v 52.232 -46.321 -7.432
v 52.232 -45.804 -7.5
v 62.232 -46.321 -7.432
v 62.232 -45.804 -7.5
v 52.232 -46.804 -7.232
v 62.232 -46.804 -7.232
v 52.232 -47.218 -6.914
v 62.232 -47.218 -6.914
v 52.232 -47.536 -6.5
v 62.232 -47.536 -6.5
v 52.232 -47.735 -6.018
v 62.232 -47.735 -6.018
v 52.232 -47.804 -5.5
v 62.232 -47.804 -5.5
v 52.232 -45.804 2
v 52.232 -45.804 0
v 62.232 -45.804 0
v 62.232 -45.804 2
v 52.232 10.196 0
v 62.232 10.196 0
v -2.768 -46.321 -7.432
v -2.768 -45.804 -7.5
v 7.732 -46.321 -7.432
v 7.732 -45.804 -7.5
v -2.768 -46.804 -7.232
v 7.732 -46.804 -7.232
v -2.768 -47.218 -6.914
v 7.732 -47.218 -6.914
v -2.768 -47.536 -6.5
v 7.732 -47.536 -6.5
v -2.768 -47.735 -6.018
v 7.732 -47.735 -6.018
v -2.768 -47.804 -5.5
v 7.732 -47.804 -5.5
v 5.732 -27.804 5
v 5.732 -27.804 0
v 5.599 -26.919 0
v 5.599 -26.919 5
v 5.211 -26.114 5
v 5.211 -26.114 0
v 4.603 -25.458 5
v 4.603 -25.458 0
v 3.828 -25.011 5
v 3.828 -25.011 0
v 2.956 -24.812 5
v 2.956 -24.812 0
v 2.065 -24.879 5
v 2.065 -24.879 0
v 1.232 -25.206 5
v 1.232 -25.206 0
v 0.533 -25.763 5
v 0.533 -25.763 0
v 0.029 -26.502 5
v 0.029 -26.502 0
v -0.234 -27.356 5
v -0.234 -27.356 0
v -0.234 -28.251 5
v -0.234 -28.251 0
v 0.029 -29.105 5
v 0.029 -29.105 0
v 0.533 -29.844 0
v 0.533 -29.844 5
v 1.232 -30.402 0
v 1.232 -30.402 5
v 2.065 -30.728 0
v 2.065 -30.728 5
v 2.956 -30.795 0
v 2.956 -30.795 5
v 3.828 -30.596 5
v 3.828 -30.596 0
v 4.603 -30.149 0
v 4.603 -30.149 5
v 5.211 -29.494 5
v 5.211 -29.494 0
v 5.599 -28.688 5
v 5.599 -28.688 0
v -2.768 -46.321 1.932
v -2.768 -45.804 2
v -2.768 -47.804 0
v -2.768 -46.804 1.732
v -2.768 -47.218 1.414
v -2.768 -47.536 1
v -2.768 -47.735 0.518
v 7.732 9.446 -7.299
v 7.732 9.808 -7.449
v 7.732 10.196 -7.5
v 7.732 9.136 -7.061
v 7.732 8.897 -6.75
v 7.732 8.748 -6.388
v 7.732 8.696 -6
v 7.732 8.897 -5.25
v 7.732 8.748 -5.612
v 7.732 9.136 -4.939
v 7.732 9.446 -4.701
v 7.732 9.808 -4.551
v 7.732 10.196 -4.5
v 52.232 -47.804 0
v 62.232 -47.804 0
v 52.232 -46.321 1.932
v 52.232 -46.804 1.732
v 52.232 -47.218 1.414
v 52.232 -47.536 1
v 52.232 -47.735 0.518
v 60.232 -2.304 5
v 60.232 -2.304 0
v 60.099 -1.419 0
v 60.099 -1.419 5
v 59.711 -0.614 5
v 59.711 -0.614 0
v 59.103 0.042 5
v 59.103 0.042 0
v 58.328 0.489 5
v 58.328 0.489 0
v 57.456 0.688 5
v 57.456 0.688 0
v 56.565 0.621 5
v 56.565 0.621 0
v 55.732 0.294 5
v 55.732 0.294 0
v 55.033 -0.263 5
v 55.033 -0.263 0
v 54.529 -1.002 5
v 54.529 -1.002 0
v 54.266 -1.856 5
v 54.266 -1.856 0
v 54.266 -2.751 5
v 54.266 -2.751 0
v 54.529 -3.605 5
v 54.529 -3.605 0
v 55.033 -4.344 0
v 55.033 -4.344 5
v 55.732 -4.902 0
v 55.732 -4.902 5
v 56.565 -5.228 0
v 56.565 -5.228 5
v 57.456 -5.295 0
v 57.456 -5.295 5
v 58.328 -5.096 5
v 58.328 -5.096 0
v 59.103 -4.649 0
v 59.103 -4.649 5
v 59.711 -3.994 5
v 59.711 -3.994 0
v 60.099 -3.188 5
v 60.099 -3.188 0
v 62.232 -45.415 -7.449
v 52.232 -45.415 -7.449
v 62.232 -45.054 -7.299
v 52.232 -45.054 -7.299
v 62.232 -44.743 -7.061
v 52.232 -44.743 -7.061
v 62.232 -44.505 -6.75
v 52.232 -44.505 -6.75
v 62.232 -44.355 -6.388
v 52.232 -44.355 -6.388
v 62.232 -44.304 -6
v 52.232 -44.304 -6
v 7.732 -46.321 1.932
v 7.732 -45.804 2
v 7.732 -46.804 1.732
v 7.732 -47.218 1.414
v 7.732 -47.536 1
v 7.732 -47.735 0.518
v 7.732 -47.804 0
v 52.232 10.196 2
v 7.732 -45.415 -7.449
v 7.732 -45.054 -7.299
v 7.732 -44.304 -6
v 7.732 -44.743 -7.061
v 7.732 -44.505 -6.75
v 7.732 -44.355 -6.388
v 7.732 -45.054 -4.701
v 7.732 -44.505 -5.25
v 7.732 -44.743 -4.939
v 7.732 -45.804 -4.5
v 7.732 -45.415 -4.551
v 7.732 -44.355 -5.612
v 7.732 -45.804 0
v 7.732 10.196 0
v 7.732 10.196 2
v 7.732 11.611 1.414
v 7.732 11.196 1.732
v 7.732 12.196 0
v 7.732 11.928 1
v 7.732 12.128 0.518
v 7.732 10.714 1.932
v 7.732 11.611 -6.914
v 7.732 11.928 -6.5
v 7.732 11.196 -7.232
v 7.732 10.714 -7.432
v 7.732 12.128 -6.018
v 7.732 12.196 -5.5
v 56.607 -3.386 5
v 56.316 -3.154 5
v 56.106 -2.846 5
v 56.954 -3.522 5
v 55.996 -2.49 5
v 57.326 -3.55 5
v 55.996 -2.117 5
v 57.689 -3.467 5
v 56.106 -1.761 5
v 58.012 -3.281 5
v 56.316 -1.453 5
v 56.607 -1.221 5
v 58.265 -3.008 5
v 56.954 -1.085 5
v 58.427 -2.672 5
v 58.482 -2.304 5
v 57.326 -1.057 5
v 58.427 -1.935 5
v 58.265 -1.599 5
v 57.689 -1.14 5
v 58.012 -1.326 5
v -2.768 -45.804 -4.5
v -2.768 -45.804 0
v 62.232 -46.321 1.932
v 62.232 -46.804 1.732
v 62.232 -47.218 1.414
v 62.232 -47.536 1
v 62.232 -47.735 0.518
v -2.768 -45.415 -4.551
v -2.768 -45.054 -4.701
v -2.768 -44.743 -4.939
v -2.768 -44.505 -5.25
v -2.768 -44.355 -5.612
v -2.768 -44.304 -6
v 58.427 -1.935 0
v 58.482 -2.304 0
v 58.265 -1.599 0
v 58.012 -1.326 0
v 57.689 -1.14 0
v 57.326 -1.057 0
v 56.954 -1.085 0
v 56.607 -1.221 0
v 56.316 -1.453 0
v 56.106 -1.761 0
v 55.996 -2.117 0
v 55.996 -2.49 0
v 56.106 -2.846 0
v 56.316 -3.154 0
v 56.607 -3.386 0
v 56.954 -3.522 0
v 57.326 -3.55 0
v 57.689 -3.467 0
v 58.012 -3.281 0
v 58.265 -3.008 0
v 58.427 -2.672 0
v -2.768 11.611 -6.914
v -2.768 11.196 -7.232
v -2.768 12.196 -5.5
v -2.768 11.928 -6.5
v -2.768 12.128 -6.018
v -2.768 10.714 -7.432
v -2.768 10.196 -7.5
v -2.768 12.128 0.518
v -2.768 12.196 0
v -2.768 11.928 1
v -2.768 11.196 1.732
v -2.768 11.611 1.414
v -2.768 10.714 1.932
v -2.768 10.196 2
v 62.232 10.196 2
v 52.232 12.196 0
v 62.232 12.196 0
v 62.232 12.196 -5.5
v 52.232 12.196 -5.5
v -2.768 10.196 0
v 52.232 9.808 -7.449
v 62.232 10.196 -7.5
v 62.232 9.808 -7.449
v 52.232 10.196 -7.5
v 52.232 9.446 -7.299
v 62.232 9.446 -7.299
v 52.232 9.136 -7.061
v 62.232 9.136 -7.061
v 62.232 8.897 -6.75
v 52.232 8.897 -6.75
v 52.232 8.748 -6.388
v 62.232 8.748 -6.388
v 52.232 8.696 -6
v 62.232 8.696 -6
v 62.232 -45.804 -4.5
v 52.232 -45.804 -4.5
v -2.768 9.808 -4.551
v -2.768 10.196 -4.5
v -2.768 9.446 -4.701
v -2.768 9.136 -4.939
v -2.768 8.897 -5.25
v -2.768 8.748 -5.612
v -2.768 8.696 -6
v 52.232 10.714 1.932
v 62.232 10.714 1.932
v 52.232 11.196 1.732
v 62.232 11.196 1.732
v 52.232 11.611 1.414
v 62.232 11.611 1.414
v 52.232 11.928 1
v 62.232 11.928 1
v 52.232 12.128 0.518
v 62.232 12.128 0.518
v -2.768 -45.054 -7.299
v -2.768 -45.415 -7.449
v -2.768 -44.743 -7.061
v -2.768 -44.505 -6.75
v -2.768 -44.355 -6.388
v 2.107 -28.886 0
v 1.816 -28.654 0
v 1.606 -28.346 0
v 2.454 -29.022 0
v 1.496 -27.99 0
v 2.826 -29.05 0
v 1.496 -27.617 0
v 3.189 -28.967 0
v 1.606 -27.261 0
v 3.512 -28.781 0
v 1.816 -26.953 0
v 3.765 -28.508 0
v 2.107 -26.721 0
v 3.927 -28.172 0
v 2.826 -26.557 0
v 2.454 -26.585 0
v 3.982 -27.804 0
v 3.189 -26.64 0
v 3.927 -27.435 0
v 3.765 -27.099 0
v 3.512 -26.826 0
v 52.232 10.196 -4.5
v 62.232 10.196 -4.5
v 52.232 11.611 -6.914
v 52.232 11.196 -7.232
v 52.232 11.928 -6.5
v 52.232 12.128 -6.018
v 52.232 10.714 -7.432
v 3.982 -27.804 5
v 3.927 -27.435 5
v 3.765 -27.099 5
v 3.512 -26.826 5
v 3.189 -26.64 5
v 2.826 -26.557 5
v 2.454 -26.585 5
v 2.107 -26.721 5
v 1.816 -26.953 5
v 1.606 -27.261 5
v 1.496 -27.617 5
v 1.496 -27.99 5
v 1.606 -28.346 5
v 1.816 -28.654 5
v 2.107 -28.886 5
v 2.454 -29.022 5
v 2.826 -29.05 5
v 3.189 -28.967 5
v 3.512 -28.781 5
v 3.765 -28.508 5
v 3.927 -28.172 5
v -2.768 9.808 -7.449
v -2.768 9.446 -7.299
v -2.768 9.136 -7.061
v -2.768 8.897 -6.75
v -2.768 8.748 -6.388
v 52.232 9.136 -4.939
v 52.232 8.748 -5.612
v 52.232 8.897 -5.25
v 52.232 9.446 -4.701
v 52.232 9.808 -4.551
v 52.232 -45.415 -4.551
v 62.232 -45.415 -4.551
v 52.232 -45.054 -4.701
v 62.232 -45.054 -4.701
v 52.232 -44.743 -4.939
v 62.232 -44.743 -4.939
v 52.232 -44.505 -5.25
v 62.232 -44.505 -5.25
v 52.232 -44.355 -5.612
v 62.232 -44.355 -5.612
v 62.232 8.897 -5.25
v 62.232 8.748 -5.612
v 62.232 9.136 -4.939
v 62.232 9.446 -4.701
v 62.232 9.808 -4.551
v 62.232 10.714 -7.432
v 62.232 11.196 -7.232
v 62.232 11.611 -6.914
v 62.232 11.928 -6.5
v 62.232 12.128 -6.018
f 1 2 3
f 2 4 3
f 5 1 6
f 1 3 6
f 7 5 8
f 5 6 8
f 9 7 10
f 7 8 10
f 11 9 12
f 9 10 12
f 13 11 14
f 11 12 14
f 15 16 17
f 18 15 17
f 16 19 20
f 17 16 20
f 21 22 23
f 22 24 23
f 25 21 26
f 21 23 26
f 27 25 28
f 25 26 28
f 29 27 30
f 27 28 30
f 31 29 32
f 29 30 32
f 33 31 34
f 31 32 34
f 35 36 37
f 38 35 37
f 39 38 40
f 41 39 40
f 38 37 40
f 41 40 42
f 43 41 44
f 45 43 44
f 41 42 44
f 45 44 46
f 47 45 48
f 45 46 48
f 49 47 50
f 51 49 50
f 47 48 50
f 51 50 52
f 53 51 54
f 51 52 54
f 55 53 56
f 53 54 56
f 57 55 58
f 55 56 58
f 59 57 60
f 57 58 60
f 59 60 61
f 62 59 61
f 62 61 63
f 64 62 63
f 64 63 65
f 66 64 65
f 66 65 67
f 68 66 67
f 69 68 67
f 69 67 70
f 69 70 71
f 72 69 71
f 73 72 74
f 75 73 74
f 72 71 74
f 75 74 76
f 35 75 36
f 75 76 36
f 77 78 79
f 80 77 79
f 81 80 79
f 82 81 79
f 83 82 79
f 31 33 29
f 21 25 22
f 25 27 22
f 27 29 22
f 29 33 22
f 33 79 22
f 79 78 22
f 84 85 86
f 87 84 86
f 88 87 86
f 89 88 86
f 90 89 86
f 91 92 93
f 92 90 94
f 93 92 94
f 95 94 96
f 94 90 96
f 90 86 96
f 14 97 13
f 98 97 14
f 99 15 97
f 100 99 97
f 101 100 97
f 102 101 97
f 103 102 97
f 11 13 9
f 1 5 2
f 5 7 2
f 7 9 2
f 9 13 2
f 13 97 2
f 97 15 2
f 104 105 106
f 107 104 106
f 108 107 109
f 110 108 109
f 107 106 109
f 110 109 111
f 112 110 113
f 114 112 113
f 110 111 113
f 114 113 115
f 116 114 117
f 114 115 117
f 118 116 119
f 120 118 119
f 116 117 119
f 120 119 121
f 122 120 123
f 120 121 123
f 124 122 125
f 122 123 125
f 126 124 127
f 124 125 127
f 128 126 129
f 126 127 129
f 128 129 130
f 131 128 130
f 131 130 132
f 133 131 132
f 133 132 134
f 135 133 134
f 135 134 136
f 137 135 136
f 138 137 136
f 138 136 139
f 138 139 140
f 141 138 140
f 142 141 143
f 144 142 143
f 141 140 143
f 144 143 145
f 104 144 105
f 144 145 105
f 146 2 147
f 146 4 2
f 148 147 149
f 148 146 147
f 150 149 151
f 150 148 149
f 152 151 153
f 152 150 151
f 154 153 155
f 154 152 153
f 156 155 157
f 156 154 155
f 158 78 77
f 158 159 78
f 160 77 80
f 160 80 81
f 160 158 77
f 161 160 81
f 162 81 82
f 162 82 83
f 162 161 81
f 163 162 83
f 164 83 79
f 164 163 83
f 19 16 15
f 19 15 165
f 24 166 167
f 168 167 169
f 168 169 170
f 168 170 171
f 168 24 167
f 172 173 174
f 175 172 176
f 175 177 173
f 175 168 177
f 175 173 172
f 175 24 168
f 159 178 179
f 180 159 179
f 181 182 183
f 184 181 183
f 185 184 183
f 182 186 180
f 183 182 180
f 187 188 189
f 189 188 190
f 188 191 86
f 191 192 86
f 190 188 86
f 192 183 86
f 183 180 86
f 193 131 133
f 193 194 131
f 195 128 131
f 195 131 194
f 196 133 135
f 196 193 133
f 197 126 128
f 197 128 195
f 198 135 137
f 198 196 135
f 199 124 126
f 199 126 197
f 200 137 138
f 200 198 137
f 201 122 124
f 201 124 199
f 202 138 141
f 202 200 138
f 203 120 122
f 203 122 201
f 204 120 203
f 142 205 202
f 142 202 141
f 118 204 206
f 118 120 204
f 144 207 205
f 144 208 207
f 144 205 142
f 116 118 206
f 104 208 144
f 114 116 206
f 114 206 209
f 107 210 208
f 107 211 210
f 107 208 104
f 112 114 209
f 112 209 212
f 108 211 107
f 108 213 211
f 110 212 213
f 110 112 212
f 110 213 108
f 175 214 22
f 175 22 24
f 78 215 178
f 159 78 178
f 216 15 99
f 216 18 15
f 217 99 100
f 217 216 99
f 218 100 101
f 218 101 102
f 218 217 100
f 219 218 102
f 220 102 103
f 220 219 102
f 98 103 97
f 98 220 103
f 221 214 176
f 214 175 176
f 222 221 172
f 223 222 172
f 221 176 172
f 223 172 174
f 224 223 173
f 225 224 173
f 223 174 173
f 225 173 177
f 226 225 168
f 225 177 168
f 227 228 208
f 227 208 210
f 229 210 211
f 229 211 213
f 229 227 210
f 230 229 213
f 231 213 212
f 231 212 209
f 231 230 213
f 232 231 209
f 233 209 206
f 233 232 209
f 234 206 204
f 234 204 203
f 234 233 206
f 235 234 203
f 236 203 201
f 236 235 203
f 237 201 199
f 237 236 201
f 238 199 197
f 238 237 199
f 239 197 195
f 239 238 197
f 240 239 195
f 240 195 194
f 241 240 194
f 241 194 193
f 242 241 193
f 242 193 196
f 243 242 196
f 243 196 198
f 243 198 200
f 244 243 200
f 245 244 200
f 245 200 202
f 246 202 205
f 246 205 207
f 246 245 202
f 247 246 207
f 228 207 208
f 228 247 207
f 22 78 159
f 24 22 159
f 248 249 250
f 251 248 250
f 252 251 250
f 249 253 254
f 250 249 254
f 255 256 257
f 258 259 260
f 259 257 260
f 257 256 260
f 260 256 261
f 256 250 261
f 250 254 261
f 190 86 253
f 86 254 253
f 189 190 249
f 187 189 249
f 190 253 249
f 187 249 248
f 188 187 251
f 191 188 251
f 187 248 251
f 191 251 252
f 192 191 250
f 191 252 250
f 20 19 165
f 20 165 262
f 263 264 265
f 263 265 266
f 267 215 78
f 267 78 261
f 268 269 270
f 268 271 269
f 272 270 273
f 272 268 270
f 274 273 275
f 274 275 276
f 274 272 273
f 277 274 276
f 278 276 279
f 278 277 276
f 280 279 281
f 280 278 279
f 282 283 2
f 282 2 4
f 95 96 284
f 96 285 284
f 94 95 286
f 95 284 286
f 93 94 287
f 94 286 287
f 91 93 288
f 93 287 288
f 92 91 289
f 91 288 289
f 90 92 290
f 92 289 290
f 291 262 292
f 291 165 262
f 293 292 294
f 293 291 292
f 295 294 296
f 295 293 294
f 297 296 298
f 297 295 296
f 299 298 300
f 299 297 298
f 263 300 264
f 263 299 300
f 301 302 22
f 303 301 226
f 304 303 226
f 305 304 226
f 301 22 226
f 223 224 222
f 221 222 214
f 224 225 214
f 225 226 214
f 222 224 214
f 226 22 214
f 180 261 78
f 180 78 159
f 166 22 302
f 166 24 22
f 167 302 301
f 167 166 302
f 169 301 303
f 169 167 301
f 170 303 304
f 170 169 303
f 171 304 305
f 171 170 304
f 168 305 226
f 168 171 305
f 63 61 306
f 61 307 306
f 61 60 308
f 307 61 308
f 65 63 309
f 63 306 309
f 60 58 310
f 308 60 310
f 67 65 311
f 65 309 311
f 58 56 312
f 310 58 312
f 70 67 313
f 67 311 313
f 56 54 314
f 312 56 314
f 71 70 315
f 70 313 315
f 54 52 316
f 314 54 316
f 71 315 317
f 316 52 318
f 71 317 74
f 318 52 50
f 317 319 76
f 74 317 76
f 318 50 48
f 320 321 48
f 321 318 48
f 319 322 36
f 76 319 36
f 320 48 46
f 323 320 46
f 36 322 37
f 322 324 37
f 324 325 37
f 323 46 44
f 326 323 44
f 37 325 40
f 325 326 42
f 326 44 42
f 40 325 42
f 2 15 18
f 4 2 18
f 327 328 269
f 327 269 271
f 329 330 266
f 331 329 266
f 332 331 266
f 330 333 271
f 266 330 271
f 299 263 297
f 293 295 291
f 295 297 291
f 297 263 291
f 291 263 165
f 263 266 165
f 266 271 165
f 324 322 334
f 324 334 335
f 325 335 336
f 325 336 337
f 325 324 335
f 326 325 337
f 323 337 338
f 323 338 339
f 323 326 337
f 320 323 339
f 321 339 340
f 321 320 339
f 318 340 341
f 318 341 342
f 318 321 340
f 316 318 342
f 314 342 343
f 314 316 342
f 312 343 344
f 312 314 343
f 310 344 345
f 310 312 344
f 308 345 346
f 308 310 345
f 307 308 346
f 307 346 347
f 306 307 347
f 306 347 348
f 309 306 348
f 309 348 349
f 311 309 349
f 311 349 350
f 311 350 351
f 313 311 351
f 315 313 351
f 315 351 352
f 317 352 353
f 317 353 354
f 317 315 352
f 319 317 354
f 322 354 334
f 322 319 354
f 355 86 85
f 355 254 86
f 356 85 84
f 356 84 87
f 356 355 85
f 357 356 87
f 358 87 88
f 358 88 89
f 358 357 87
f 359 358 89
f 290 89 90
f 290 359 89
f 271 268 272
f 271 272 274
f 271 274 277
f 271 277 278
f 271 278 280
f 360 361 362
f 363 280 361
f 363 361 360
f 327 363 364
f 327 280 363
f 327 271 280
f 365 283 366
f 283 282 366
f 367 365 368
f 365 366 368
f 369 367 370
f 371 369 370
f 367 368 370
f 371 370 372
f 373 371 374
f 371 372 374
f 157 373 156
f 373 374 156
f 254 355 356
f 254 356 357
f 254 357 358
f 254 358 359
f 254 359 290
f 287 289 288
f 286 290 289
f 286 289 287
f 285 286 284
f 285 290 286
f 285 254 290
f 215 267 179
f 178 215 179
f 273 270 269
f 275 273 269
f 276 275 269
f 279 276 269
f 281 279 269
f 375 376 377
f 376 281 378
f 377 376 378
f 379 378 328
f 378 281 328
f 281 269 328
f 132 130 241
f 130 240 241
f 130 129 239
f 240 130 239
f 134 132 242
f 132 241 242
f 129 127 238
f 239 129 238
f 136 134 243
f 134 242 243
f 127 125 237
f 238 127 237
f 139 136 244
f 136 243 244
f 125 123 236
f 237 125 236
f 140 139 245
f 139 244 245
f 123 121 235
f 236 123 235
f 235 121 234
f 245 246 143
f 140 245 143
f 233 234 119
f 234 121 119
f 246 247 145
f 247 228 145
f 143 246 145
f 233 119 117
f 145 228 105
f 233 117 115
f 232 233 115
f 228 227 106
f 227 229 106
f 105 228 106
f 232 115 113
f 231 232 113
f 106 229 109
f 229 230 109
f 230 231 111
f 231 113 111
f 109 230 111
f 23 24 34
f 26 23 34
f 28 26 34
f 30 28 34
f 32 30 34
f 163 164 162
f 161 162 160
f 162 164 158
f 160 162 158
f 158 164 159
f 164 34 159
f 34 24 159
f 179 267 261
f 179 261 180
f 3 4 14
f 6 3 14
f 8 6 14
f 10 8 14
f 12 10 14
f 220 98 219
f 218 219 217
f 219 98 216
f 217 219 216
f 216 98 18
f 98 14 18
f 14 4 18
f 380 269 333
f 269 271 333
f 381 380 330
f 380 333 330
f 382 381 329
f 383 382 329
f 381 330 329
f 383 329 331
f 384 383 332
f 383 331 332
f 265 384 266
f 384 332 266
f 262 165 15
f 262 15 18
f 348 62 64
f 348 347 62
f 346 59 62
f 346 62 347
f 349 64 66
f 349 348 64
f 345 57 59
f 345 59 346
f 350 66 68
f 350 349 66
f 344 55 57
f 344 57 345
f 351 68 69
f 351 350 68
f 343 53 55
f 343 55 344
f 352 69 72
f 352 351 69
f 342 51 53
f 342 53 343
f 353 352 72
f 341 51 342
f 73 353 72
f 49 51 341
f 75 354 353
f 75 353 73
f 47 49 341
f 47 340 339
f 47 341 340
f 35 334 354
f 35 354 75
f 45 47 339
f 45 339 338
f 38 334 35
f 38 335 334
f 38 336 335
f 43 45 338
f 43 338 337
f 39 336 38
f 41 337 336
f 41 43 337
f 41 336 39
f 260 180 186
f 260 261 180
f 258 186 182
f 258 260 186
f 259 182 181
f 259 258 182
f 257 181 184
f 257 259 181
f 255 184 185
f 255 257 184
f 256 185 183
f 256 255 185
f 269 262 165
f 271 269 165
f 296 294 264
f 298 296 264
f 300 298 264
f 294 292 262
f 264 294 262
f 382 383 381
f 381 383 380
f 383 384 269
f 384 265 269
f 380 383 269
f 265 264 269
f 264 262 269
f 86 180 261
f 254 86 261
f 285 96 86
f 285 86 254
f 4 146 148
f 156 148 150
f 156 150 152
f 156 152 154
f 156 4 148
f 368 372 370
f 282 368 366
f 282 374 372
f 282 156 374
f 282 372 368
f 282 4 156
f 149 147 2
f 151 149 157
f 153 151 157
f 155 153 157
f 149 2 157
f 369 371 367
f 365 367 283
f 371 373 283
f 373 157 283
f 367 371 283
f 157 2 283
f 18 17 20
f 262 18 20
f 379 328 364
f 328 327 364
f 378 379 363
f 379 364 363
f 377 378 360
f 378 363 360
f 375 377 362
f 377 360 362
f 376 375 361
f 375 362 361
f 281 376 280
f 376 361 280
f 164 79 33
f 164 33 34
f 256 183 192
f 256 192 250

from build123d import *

# Parameters (mm, degrees)
F0_R     = 3
F0_R_2   = 1.25
F1_DEPTH = 5
F2_W     = 10.4999952316
F2_H     = 56
F3_DEPTH = 2
F2_W_2   = 10.0000047684
F4_W     = 10.4999952316
F4_H     = 2
F4_H_2   = 4.5
F4_H_3   = 3
F6_DEPTH = 2
F4_W_2   = 10.0000047684
F5_W     = 10.4999952316
F5_H     = 2
F5_H_2   = 4.5
F5_H_3   = 3
F7_DEPTH = 2
F5_W_2   = 10.0000047684
F5_H_4   = 6.5
F8_DEPTH = 1.5
F9_DEPTH = 1.5
F10_R    = 1.99999
F10_2_R  = 1.99999
F10_3_R  = 1.99999
F10_4_R  = 1.99999
F11_R    = 1.49999
F11_2_R  = 1.49999
F11_3_R  = 1.49999
F11_4_R  = 1.49999


# Not quite as in the source:
# - a fillet or chamfer is up to 0.001 mm smaller than in the source, because OpenCascade refuses the exact size


with BuildPart() as f1:
    # F0 (on Top) → F1 (new body)
    with BuildSketch(Plane.XY):
        with Locations((2.732144177, -27.8035767078)):
            Circle(F0_R)
        with Locations((2.732144177, -27.8035767078)):
            Circle(F0_R_2, mode=Mode.SUBTRACT)
    extrude(amount=F1_DEPTH)


with BuildPart() as f1b:
    # F0 (on Top) → F1, piece 2 (new body)
    with BuildSketch(Plane.XY):
        with Locations((57.232144177, -2.3035767078)):
            Circle(F0_R)
        with Locations((57.232144177, -2.3035767078)):
            Circle(F0_R_2, mode=Mode.SUBTRACT)
    extrude(amount=F1_DEPTH)


with BuildPart() as f3:
    # F2 (on Top) → F3 (new body)
    with BuildSketch(Plane.XY):
        with Locations((2.4821465611, -17.8035767078)):
            Rectangle(F2_W, F2_H)
    extrude(amount=F3_DEPTH)


with BuildPart() as f3b:
    # F2 (on Top) → F3, piece 2 (new body)
    with BuildSketch(Plane.XY):
        with Locations((57.2321465611, -17.8035767078)):
            Rectangle(F2_W_2, F2_H)
    extrude(amount=F3_DEPTH)


with BuildPart() as f6:
    # F4 (on face) → F6 (new body)
    with BuildSketch(Plane(origin=(0, 10.1964232922, 0), x_dir=(-1, 0, 0), z_dir=(0, 1, 0))):
        with Locations((-2.4821465611, 1)):
            Rectangle(F4_W, F4_H)
        with Locations((-2.4821465611, -2.25)):
            Rectangle(F4_W, F4_H_2)
        with Locations((-2.4821465611, -6)):
            Rectangle(F4_W, F4_H_3)
    extrude(amount=F6_DEPTH)

    # F10#3 (radius 2 in the source; OpenCascade refuses exactly that, so slightly less here)
    f10_3_edges = [f6.edges().sort_by_distance(p)[0] for p in [
        (2.482147, 12.196423, 2),
        (2.482147, 12.196423, -7.5),
    ]]
    fillet(f10_3_edges, radius=F10_3_R)


with BuildPart() as f6b:
    # F4 (on face) → F6, piece 2 (new body)
    with BuildSketch(Plane(origin=(0, 10.1964232922, 0), x_dir=(-1, 0, 0), z_dir=(0, 1, 0))):
        with Locations((-57.2321465611, 1)):
            Rectangle(F4_W_2, F4_H)
        with Locations((-57.2321465611, -2.25)):
            Rectangle(F4_W_2, F4_H_2)
        with Locations((-57.2321465611, -6)):
            Rectangle(F4_W_2, F4_H_3)
    extrude(amount=F6_DEPTH)

    # F10 (radius 2 in the source; OpenCascade refuses exactly that, so slightly less here)
    f10_edges = [f6b.edges().sort_by_distance(p)[0] for p in [
        (57.232147, 12.196423, 2),
        (57.232147, 12.196423, -7.5),
    ]]
    fillet(f10_edges, radius=F10_R)


with BuildPart() as f7:
    # F5 (on face) → F7 (new body)
    with BuildSketch(Plane.XZ.offset(45.8035767078)):
        with Locations((2.4821465611, 1)):
            Rectangle(F5_W, F5_H)
        with Locations((2.4821465611, -2.25)):
            Rectangle(F5_W, F5_H_2)
        with Locations((2.4821465611, -6)):
            Rectangle(F5_W, F5_H_3)
    extrude(amount=F7_DEPTH)

    # F10#4 (radius 2 in the source; OpenCascade refuses exactly that, so slightly less here)
    f10_4_edges = [f7.edges().sort_by_distance(p)[0] for p in [
        (2.482147, -47.803577, 2),
        (2.482147, -47.803577, -7.5),
    ]]
    fillet(f10_4_edges, radius=F10_4_R)


with BuildPart() as f7b:
    # F5 (on face) → F7, piece 2 (new body)
    with BuildSketch(Plane.XZ.offset(45.8035767078)):
        with Locations((57.2321465611, -1.25)):
            Rectangle(F5_W_2, F5_H_4)
        with Locations((57.2321465611, -6)):
            Rectangle(F5_W_2, F5_H_3)
    extrude(amount=F7_DEPTH)

    # F10#2 (radius 2 in the source; OpenCascade refuses exactly that, so slightly less here)
    f10_2_edges = [f7b.edges().sort_by_distance(p)[0] for p in [
        (57.232147, -47.803577, 2),
        (57.232147, -47.803577, -7.5),
    ]]
    fillet(f10_2_edges, radius=F10_2_R)


with BuildPart() as f8:
    # F4 (on face) → F8 (new body)
    with BuildSketch(Plane(origin=(0, 10.1964232922, 0), x_dir=(-1, 0, 0), z_dir=(0, 1, 0))):
        with Locations((-2.4821465611, -6)):
            Rectangle(F4_W, F4_H_3)
    extrude(amount=-F8_DEPTH)

    # F11#4 (radius 1.5 in the source; OpenCascade refuses exactly that, so slightly less here)
    f11_4_edges = [f8.edges().sort_by_distance(p)[0] for p in [
        (2.482147, 8.696423, -4.5),
        (2.482147, 8.696423, -7.5),
    ]]
    fillet(f11_4_edges, radius=F11_4_R)


with BuildPart() as f8b:
    # F4 (on face) → F8, piece 2 (new body)
    with BuildSketch(Plane(origin=(0, 10.1964232922, 0), x_dir=(-1, 0, 0), z_dir=(0, 1, 0))):
        with Locations((-57.2321465611, -6)):
            Rectangle(F4_W_2, F4_H_3)
    extrude(amount=-F8_DEPTH)

    # F11#3 (radius 1.5 in the source; OpenCascade refuses exactly that, so slightly less here)
    f11_3_edges = [f8b.edges().sort_by_distance(p)[0] for p in [
        (57.232147, 8.696423, -4.5),
        (57.232147, 8.696423, -7.5),
    ]]
    fillet(f11_3_edges, radius=F11_3_R)


with BuildPart() as f9:
    # F5 (on face) → F9 (new body)
    with BuildSketch(Plane.XZ.offset(45.8035767078)):
        with Locations((57.2321465611, -6)):
            Rectangle(F5_W_2, F5_H_3)
    extrude(amount=-F9_DEPTH)

    # F11#2 (radius 1.5 in the source; OpenCascade refuses exactly that, so slightly less here)
    f11_2_edges = [f9.edges().sort_by_distance(p)[0] for p in [
        (57.232147, -44.303577, -4.5),
        (57.232147, -44.303577, -7.5),
    ]]
    fillet(f11_2_edges, radius=F11_2_R)


with BuildPart() as f9b:
    # F5 (on face) → F9, piece 2 (new body)
    with BuildSketch(Plane.XZ.offset(45.8035767078)):
        with Locations((2.4821465611, -6)):
            Rectangle(F5_W, F5_H_3)
    extrude(amount=-F9_DEPTH)

    # F11 (radius 1.5 in the source; OpenCascade refuses exactly that, so slightly less here)
    f11_edges = [f9b.edges().sort_by_distance(p)[0] for p in [
        (2.482147, -44.303577, -7.5),
        (2.482147, -44.303577, -4.5),
    ]]
    fillet(f11_edges, radius=F11_R)


solid = Compound([f1.part, f1b.part, f3.part, f3b.part, f6.part, f6b.part, f7.part, f7b.part, f8.part, f8b.part, f9.part, f9b.part])
